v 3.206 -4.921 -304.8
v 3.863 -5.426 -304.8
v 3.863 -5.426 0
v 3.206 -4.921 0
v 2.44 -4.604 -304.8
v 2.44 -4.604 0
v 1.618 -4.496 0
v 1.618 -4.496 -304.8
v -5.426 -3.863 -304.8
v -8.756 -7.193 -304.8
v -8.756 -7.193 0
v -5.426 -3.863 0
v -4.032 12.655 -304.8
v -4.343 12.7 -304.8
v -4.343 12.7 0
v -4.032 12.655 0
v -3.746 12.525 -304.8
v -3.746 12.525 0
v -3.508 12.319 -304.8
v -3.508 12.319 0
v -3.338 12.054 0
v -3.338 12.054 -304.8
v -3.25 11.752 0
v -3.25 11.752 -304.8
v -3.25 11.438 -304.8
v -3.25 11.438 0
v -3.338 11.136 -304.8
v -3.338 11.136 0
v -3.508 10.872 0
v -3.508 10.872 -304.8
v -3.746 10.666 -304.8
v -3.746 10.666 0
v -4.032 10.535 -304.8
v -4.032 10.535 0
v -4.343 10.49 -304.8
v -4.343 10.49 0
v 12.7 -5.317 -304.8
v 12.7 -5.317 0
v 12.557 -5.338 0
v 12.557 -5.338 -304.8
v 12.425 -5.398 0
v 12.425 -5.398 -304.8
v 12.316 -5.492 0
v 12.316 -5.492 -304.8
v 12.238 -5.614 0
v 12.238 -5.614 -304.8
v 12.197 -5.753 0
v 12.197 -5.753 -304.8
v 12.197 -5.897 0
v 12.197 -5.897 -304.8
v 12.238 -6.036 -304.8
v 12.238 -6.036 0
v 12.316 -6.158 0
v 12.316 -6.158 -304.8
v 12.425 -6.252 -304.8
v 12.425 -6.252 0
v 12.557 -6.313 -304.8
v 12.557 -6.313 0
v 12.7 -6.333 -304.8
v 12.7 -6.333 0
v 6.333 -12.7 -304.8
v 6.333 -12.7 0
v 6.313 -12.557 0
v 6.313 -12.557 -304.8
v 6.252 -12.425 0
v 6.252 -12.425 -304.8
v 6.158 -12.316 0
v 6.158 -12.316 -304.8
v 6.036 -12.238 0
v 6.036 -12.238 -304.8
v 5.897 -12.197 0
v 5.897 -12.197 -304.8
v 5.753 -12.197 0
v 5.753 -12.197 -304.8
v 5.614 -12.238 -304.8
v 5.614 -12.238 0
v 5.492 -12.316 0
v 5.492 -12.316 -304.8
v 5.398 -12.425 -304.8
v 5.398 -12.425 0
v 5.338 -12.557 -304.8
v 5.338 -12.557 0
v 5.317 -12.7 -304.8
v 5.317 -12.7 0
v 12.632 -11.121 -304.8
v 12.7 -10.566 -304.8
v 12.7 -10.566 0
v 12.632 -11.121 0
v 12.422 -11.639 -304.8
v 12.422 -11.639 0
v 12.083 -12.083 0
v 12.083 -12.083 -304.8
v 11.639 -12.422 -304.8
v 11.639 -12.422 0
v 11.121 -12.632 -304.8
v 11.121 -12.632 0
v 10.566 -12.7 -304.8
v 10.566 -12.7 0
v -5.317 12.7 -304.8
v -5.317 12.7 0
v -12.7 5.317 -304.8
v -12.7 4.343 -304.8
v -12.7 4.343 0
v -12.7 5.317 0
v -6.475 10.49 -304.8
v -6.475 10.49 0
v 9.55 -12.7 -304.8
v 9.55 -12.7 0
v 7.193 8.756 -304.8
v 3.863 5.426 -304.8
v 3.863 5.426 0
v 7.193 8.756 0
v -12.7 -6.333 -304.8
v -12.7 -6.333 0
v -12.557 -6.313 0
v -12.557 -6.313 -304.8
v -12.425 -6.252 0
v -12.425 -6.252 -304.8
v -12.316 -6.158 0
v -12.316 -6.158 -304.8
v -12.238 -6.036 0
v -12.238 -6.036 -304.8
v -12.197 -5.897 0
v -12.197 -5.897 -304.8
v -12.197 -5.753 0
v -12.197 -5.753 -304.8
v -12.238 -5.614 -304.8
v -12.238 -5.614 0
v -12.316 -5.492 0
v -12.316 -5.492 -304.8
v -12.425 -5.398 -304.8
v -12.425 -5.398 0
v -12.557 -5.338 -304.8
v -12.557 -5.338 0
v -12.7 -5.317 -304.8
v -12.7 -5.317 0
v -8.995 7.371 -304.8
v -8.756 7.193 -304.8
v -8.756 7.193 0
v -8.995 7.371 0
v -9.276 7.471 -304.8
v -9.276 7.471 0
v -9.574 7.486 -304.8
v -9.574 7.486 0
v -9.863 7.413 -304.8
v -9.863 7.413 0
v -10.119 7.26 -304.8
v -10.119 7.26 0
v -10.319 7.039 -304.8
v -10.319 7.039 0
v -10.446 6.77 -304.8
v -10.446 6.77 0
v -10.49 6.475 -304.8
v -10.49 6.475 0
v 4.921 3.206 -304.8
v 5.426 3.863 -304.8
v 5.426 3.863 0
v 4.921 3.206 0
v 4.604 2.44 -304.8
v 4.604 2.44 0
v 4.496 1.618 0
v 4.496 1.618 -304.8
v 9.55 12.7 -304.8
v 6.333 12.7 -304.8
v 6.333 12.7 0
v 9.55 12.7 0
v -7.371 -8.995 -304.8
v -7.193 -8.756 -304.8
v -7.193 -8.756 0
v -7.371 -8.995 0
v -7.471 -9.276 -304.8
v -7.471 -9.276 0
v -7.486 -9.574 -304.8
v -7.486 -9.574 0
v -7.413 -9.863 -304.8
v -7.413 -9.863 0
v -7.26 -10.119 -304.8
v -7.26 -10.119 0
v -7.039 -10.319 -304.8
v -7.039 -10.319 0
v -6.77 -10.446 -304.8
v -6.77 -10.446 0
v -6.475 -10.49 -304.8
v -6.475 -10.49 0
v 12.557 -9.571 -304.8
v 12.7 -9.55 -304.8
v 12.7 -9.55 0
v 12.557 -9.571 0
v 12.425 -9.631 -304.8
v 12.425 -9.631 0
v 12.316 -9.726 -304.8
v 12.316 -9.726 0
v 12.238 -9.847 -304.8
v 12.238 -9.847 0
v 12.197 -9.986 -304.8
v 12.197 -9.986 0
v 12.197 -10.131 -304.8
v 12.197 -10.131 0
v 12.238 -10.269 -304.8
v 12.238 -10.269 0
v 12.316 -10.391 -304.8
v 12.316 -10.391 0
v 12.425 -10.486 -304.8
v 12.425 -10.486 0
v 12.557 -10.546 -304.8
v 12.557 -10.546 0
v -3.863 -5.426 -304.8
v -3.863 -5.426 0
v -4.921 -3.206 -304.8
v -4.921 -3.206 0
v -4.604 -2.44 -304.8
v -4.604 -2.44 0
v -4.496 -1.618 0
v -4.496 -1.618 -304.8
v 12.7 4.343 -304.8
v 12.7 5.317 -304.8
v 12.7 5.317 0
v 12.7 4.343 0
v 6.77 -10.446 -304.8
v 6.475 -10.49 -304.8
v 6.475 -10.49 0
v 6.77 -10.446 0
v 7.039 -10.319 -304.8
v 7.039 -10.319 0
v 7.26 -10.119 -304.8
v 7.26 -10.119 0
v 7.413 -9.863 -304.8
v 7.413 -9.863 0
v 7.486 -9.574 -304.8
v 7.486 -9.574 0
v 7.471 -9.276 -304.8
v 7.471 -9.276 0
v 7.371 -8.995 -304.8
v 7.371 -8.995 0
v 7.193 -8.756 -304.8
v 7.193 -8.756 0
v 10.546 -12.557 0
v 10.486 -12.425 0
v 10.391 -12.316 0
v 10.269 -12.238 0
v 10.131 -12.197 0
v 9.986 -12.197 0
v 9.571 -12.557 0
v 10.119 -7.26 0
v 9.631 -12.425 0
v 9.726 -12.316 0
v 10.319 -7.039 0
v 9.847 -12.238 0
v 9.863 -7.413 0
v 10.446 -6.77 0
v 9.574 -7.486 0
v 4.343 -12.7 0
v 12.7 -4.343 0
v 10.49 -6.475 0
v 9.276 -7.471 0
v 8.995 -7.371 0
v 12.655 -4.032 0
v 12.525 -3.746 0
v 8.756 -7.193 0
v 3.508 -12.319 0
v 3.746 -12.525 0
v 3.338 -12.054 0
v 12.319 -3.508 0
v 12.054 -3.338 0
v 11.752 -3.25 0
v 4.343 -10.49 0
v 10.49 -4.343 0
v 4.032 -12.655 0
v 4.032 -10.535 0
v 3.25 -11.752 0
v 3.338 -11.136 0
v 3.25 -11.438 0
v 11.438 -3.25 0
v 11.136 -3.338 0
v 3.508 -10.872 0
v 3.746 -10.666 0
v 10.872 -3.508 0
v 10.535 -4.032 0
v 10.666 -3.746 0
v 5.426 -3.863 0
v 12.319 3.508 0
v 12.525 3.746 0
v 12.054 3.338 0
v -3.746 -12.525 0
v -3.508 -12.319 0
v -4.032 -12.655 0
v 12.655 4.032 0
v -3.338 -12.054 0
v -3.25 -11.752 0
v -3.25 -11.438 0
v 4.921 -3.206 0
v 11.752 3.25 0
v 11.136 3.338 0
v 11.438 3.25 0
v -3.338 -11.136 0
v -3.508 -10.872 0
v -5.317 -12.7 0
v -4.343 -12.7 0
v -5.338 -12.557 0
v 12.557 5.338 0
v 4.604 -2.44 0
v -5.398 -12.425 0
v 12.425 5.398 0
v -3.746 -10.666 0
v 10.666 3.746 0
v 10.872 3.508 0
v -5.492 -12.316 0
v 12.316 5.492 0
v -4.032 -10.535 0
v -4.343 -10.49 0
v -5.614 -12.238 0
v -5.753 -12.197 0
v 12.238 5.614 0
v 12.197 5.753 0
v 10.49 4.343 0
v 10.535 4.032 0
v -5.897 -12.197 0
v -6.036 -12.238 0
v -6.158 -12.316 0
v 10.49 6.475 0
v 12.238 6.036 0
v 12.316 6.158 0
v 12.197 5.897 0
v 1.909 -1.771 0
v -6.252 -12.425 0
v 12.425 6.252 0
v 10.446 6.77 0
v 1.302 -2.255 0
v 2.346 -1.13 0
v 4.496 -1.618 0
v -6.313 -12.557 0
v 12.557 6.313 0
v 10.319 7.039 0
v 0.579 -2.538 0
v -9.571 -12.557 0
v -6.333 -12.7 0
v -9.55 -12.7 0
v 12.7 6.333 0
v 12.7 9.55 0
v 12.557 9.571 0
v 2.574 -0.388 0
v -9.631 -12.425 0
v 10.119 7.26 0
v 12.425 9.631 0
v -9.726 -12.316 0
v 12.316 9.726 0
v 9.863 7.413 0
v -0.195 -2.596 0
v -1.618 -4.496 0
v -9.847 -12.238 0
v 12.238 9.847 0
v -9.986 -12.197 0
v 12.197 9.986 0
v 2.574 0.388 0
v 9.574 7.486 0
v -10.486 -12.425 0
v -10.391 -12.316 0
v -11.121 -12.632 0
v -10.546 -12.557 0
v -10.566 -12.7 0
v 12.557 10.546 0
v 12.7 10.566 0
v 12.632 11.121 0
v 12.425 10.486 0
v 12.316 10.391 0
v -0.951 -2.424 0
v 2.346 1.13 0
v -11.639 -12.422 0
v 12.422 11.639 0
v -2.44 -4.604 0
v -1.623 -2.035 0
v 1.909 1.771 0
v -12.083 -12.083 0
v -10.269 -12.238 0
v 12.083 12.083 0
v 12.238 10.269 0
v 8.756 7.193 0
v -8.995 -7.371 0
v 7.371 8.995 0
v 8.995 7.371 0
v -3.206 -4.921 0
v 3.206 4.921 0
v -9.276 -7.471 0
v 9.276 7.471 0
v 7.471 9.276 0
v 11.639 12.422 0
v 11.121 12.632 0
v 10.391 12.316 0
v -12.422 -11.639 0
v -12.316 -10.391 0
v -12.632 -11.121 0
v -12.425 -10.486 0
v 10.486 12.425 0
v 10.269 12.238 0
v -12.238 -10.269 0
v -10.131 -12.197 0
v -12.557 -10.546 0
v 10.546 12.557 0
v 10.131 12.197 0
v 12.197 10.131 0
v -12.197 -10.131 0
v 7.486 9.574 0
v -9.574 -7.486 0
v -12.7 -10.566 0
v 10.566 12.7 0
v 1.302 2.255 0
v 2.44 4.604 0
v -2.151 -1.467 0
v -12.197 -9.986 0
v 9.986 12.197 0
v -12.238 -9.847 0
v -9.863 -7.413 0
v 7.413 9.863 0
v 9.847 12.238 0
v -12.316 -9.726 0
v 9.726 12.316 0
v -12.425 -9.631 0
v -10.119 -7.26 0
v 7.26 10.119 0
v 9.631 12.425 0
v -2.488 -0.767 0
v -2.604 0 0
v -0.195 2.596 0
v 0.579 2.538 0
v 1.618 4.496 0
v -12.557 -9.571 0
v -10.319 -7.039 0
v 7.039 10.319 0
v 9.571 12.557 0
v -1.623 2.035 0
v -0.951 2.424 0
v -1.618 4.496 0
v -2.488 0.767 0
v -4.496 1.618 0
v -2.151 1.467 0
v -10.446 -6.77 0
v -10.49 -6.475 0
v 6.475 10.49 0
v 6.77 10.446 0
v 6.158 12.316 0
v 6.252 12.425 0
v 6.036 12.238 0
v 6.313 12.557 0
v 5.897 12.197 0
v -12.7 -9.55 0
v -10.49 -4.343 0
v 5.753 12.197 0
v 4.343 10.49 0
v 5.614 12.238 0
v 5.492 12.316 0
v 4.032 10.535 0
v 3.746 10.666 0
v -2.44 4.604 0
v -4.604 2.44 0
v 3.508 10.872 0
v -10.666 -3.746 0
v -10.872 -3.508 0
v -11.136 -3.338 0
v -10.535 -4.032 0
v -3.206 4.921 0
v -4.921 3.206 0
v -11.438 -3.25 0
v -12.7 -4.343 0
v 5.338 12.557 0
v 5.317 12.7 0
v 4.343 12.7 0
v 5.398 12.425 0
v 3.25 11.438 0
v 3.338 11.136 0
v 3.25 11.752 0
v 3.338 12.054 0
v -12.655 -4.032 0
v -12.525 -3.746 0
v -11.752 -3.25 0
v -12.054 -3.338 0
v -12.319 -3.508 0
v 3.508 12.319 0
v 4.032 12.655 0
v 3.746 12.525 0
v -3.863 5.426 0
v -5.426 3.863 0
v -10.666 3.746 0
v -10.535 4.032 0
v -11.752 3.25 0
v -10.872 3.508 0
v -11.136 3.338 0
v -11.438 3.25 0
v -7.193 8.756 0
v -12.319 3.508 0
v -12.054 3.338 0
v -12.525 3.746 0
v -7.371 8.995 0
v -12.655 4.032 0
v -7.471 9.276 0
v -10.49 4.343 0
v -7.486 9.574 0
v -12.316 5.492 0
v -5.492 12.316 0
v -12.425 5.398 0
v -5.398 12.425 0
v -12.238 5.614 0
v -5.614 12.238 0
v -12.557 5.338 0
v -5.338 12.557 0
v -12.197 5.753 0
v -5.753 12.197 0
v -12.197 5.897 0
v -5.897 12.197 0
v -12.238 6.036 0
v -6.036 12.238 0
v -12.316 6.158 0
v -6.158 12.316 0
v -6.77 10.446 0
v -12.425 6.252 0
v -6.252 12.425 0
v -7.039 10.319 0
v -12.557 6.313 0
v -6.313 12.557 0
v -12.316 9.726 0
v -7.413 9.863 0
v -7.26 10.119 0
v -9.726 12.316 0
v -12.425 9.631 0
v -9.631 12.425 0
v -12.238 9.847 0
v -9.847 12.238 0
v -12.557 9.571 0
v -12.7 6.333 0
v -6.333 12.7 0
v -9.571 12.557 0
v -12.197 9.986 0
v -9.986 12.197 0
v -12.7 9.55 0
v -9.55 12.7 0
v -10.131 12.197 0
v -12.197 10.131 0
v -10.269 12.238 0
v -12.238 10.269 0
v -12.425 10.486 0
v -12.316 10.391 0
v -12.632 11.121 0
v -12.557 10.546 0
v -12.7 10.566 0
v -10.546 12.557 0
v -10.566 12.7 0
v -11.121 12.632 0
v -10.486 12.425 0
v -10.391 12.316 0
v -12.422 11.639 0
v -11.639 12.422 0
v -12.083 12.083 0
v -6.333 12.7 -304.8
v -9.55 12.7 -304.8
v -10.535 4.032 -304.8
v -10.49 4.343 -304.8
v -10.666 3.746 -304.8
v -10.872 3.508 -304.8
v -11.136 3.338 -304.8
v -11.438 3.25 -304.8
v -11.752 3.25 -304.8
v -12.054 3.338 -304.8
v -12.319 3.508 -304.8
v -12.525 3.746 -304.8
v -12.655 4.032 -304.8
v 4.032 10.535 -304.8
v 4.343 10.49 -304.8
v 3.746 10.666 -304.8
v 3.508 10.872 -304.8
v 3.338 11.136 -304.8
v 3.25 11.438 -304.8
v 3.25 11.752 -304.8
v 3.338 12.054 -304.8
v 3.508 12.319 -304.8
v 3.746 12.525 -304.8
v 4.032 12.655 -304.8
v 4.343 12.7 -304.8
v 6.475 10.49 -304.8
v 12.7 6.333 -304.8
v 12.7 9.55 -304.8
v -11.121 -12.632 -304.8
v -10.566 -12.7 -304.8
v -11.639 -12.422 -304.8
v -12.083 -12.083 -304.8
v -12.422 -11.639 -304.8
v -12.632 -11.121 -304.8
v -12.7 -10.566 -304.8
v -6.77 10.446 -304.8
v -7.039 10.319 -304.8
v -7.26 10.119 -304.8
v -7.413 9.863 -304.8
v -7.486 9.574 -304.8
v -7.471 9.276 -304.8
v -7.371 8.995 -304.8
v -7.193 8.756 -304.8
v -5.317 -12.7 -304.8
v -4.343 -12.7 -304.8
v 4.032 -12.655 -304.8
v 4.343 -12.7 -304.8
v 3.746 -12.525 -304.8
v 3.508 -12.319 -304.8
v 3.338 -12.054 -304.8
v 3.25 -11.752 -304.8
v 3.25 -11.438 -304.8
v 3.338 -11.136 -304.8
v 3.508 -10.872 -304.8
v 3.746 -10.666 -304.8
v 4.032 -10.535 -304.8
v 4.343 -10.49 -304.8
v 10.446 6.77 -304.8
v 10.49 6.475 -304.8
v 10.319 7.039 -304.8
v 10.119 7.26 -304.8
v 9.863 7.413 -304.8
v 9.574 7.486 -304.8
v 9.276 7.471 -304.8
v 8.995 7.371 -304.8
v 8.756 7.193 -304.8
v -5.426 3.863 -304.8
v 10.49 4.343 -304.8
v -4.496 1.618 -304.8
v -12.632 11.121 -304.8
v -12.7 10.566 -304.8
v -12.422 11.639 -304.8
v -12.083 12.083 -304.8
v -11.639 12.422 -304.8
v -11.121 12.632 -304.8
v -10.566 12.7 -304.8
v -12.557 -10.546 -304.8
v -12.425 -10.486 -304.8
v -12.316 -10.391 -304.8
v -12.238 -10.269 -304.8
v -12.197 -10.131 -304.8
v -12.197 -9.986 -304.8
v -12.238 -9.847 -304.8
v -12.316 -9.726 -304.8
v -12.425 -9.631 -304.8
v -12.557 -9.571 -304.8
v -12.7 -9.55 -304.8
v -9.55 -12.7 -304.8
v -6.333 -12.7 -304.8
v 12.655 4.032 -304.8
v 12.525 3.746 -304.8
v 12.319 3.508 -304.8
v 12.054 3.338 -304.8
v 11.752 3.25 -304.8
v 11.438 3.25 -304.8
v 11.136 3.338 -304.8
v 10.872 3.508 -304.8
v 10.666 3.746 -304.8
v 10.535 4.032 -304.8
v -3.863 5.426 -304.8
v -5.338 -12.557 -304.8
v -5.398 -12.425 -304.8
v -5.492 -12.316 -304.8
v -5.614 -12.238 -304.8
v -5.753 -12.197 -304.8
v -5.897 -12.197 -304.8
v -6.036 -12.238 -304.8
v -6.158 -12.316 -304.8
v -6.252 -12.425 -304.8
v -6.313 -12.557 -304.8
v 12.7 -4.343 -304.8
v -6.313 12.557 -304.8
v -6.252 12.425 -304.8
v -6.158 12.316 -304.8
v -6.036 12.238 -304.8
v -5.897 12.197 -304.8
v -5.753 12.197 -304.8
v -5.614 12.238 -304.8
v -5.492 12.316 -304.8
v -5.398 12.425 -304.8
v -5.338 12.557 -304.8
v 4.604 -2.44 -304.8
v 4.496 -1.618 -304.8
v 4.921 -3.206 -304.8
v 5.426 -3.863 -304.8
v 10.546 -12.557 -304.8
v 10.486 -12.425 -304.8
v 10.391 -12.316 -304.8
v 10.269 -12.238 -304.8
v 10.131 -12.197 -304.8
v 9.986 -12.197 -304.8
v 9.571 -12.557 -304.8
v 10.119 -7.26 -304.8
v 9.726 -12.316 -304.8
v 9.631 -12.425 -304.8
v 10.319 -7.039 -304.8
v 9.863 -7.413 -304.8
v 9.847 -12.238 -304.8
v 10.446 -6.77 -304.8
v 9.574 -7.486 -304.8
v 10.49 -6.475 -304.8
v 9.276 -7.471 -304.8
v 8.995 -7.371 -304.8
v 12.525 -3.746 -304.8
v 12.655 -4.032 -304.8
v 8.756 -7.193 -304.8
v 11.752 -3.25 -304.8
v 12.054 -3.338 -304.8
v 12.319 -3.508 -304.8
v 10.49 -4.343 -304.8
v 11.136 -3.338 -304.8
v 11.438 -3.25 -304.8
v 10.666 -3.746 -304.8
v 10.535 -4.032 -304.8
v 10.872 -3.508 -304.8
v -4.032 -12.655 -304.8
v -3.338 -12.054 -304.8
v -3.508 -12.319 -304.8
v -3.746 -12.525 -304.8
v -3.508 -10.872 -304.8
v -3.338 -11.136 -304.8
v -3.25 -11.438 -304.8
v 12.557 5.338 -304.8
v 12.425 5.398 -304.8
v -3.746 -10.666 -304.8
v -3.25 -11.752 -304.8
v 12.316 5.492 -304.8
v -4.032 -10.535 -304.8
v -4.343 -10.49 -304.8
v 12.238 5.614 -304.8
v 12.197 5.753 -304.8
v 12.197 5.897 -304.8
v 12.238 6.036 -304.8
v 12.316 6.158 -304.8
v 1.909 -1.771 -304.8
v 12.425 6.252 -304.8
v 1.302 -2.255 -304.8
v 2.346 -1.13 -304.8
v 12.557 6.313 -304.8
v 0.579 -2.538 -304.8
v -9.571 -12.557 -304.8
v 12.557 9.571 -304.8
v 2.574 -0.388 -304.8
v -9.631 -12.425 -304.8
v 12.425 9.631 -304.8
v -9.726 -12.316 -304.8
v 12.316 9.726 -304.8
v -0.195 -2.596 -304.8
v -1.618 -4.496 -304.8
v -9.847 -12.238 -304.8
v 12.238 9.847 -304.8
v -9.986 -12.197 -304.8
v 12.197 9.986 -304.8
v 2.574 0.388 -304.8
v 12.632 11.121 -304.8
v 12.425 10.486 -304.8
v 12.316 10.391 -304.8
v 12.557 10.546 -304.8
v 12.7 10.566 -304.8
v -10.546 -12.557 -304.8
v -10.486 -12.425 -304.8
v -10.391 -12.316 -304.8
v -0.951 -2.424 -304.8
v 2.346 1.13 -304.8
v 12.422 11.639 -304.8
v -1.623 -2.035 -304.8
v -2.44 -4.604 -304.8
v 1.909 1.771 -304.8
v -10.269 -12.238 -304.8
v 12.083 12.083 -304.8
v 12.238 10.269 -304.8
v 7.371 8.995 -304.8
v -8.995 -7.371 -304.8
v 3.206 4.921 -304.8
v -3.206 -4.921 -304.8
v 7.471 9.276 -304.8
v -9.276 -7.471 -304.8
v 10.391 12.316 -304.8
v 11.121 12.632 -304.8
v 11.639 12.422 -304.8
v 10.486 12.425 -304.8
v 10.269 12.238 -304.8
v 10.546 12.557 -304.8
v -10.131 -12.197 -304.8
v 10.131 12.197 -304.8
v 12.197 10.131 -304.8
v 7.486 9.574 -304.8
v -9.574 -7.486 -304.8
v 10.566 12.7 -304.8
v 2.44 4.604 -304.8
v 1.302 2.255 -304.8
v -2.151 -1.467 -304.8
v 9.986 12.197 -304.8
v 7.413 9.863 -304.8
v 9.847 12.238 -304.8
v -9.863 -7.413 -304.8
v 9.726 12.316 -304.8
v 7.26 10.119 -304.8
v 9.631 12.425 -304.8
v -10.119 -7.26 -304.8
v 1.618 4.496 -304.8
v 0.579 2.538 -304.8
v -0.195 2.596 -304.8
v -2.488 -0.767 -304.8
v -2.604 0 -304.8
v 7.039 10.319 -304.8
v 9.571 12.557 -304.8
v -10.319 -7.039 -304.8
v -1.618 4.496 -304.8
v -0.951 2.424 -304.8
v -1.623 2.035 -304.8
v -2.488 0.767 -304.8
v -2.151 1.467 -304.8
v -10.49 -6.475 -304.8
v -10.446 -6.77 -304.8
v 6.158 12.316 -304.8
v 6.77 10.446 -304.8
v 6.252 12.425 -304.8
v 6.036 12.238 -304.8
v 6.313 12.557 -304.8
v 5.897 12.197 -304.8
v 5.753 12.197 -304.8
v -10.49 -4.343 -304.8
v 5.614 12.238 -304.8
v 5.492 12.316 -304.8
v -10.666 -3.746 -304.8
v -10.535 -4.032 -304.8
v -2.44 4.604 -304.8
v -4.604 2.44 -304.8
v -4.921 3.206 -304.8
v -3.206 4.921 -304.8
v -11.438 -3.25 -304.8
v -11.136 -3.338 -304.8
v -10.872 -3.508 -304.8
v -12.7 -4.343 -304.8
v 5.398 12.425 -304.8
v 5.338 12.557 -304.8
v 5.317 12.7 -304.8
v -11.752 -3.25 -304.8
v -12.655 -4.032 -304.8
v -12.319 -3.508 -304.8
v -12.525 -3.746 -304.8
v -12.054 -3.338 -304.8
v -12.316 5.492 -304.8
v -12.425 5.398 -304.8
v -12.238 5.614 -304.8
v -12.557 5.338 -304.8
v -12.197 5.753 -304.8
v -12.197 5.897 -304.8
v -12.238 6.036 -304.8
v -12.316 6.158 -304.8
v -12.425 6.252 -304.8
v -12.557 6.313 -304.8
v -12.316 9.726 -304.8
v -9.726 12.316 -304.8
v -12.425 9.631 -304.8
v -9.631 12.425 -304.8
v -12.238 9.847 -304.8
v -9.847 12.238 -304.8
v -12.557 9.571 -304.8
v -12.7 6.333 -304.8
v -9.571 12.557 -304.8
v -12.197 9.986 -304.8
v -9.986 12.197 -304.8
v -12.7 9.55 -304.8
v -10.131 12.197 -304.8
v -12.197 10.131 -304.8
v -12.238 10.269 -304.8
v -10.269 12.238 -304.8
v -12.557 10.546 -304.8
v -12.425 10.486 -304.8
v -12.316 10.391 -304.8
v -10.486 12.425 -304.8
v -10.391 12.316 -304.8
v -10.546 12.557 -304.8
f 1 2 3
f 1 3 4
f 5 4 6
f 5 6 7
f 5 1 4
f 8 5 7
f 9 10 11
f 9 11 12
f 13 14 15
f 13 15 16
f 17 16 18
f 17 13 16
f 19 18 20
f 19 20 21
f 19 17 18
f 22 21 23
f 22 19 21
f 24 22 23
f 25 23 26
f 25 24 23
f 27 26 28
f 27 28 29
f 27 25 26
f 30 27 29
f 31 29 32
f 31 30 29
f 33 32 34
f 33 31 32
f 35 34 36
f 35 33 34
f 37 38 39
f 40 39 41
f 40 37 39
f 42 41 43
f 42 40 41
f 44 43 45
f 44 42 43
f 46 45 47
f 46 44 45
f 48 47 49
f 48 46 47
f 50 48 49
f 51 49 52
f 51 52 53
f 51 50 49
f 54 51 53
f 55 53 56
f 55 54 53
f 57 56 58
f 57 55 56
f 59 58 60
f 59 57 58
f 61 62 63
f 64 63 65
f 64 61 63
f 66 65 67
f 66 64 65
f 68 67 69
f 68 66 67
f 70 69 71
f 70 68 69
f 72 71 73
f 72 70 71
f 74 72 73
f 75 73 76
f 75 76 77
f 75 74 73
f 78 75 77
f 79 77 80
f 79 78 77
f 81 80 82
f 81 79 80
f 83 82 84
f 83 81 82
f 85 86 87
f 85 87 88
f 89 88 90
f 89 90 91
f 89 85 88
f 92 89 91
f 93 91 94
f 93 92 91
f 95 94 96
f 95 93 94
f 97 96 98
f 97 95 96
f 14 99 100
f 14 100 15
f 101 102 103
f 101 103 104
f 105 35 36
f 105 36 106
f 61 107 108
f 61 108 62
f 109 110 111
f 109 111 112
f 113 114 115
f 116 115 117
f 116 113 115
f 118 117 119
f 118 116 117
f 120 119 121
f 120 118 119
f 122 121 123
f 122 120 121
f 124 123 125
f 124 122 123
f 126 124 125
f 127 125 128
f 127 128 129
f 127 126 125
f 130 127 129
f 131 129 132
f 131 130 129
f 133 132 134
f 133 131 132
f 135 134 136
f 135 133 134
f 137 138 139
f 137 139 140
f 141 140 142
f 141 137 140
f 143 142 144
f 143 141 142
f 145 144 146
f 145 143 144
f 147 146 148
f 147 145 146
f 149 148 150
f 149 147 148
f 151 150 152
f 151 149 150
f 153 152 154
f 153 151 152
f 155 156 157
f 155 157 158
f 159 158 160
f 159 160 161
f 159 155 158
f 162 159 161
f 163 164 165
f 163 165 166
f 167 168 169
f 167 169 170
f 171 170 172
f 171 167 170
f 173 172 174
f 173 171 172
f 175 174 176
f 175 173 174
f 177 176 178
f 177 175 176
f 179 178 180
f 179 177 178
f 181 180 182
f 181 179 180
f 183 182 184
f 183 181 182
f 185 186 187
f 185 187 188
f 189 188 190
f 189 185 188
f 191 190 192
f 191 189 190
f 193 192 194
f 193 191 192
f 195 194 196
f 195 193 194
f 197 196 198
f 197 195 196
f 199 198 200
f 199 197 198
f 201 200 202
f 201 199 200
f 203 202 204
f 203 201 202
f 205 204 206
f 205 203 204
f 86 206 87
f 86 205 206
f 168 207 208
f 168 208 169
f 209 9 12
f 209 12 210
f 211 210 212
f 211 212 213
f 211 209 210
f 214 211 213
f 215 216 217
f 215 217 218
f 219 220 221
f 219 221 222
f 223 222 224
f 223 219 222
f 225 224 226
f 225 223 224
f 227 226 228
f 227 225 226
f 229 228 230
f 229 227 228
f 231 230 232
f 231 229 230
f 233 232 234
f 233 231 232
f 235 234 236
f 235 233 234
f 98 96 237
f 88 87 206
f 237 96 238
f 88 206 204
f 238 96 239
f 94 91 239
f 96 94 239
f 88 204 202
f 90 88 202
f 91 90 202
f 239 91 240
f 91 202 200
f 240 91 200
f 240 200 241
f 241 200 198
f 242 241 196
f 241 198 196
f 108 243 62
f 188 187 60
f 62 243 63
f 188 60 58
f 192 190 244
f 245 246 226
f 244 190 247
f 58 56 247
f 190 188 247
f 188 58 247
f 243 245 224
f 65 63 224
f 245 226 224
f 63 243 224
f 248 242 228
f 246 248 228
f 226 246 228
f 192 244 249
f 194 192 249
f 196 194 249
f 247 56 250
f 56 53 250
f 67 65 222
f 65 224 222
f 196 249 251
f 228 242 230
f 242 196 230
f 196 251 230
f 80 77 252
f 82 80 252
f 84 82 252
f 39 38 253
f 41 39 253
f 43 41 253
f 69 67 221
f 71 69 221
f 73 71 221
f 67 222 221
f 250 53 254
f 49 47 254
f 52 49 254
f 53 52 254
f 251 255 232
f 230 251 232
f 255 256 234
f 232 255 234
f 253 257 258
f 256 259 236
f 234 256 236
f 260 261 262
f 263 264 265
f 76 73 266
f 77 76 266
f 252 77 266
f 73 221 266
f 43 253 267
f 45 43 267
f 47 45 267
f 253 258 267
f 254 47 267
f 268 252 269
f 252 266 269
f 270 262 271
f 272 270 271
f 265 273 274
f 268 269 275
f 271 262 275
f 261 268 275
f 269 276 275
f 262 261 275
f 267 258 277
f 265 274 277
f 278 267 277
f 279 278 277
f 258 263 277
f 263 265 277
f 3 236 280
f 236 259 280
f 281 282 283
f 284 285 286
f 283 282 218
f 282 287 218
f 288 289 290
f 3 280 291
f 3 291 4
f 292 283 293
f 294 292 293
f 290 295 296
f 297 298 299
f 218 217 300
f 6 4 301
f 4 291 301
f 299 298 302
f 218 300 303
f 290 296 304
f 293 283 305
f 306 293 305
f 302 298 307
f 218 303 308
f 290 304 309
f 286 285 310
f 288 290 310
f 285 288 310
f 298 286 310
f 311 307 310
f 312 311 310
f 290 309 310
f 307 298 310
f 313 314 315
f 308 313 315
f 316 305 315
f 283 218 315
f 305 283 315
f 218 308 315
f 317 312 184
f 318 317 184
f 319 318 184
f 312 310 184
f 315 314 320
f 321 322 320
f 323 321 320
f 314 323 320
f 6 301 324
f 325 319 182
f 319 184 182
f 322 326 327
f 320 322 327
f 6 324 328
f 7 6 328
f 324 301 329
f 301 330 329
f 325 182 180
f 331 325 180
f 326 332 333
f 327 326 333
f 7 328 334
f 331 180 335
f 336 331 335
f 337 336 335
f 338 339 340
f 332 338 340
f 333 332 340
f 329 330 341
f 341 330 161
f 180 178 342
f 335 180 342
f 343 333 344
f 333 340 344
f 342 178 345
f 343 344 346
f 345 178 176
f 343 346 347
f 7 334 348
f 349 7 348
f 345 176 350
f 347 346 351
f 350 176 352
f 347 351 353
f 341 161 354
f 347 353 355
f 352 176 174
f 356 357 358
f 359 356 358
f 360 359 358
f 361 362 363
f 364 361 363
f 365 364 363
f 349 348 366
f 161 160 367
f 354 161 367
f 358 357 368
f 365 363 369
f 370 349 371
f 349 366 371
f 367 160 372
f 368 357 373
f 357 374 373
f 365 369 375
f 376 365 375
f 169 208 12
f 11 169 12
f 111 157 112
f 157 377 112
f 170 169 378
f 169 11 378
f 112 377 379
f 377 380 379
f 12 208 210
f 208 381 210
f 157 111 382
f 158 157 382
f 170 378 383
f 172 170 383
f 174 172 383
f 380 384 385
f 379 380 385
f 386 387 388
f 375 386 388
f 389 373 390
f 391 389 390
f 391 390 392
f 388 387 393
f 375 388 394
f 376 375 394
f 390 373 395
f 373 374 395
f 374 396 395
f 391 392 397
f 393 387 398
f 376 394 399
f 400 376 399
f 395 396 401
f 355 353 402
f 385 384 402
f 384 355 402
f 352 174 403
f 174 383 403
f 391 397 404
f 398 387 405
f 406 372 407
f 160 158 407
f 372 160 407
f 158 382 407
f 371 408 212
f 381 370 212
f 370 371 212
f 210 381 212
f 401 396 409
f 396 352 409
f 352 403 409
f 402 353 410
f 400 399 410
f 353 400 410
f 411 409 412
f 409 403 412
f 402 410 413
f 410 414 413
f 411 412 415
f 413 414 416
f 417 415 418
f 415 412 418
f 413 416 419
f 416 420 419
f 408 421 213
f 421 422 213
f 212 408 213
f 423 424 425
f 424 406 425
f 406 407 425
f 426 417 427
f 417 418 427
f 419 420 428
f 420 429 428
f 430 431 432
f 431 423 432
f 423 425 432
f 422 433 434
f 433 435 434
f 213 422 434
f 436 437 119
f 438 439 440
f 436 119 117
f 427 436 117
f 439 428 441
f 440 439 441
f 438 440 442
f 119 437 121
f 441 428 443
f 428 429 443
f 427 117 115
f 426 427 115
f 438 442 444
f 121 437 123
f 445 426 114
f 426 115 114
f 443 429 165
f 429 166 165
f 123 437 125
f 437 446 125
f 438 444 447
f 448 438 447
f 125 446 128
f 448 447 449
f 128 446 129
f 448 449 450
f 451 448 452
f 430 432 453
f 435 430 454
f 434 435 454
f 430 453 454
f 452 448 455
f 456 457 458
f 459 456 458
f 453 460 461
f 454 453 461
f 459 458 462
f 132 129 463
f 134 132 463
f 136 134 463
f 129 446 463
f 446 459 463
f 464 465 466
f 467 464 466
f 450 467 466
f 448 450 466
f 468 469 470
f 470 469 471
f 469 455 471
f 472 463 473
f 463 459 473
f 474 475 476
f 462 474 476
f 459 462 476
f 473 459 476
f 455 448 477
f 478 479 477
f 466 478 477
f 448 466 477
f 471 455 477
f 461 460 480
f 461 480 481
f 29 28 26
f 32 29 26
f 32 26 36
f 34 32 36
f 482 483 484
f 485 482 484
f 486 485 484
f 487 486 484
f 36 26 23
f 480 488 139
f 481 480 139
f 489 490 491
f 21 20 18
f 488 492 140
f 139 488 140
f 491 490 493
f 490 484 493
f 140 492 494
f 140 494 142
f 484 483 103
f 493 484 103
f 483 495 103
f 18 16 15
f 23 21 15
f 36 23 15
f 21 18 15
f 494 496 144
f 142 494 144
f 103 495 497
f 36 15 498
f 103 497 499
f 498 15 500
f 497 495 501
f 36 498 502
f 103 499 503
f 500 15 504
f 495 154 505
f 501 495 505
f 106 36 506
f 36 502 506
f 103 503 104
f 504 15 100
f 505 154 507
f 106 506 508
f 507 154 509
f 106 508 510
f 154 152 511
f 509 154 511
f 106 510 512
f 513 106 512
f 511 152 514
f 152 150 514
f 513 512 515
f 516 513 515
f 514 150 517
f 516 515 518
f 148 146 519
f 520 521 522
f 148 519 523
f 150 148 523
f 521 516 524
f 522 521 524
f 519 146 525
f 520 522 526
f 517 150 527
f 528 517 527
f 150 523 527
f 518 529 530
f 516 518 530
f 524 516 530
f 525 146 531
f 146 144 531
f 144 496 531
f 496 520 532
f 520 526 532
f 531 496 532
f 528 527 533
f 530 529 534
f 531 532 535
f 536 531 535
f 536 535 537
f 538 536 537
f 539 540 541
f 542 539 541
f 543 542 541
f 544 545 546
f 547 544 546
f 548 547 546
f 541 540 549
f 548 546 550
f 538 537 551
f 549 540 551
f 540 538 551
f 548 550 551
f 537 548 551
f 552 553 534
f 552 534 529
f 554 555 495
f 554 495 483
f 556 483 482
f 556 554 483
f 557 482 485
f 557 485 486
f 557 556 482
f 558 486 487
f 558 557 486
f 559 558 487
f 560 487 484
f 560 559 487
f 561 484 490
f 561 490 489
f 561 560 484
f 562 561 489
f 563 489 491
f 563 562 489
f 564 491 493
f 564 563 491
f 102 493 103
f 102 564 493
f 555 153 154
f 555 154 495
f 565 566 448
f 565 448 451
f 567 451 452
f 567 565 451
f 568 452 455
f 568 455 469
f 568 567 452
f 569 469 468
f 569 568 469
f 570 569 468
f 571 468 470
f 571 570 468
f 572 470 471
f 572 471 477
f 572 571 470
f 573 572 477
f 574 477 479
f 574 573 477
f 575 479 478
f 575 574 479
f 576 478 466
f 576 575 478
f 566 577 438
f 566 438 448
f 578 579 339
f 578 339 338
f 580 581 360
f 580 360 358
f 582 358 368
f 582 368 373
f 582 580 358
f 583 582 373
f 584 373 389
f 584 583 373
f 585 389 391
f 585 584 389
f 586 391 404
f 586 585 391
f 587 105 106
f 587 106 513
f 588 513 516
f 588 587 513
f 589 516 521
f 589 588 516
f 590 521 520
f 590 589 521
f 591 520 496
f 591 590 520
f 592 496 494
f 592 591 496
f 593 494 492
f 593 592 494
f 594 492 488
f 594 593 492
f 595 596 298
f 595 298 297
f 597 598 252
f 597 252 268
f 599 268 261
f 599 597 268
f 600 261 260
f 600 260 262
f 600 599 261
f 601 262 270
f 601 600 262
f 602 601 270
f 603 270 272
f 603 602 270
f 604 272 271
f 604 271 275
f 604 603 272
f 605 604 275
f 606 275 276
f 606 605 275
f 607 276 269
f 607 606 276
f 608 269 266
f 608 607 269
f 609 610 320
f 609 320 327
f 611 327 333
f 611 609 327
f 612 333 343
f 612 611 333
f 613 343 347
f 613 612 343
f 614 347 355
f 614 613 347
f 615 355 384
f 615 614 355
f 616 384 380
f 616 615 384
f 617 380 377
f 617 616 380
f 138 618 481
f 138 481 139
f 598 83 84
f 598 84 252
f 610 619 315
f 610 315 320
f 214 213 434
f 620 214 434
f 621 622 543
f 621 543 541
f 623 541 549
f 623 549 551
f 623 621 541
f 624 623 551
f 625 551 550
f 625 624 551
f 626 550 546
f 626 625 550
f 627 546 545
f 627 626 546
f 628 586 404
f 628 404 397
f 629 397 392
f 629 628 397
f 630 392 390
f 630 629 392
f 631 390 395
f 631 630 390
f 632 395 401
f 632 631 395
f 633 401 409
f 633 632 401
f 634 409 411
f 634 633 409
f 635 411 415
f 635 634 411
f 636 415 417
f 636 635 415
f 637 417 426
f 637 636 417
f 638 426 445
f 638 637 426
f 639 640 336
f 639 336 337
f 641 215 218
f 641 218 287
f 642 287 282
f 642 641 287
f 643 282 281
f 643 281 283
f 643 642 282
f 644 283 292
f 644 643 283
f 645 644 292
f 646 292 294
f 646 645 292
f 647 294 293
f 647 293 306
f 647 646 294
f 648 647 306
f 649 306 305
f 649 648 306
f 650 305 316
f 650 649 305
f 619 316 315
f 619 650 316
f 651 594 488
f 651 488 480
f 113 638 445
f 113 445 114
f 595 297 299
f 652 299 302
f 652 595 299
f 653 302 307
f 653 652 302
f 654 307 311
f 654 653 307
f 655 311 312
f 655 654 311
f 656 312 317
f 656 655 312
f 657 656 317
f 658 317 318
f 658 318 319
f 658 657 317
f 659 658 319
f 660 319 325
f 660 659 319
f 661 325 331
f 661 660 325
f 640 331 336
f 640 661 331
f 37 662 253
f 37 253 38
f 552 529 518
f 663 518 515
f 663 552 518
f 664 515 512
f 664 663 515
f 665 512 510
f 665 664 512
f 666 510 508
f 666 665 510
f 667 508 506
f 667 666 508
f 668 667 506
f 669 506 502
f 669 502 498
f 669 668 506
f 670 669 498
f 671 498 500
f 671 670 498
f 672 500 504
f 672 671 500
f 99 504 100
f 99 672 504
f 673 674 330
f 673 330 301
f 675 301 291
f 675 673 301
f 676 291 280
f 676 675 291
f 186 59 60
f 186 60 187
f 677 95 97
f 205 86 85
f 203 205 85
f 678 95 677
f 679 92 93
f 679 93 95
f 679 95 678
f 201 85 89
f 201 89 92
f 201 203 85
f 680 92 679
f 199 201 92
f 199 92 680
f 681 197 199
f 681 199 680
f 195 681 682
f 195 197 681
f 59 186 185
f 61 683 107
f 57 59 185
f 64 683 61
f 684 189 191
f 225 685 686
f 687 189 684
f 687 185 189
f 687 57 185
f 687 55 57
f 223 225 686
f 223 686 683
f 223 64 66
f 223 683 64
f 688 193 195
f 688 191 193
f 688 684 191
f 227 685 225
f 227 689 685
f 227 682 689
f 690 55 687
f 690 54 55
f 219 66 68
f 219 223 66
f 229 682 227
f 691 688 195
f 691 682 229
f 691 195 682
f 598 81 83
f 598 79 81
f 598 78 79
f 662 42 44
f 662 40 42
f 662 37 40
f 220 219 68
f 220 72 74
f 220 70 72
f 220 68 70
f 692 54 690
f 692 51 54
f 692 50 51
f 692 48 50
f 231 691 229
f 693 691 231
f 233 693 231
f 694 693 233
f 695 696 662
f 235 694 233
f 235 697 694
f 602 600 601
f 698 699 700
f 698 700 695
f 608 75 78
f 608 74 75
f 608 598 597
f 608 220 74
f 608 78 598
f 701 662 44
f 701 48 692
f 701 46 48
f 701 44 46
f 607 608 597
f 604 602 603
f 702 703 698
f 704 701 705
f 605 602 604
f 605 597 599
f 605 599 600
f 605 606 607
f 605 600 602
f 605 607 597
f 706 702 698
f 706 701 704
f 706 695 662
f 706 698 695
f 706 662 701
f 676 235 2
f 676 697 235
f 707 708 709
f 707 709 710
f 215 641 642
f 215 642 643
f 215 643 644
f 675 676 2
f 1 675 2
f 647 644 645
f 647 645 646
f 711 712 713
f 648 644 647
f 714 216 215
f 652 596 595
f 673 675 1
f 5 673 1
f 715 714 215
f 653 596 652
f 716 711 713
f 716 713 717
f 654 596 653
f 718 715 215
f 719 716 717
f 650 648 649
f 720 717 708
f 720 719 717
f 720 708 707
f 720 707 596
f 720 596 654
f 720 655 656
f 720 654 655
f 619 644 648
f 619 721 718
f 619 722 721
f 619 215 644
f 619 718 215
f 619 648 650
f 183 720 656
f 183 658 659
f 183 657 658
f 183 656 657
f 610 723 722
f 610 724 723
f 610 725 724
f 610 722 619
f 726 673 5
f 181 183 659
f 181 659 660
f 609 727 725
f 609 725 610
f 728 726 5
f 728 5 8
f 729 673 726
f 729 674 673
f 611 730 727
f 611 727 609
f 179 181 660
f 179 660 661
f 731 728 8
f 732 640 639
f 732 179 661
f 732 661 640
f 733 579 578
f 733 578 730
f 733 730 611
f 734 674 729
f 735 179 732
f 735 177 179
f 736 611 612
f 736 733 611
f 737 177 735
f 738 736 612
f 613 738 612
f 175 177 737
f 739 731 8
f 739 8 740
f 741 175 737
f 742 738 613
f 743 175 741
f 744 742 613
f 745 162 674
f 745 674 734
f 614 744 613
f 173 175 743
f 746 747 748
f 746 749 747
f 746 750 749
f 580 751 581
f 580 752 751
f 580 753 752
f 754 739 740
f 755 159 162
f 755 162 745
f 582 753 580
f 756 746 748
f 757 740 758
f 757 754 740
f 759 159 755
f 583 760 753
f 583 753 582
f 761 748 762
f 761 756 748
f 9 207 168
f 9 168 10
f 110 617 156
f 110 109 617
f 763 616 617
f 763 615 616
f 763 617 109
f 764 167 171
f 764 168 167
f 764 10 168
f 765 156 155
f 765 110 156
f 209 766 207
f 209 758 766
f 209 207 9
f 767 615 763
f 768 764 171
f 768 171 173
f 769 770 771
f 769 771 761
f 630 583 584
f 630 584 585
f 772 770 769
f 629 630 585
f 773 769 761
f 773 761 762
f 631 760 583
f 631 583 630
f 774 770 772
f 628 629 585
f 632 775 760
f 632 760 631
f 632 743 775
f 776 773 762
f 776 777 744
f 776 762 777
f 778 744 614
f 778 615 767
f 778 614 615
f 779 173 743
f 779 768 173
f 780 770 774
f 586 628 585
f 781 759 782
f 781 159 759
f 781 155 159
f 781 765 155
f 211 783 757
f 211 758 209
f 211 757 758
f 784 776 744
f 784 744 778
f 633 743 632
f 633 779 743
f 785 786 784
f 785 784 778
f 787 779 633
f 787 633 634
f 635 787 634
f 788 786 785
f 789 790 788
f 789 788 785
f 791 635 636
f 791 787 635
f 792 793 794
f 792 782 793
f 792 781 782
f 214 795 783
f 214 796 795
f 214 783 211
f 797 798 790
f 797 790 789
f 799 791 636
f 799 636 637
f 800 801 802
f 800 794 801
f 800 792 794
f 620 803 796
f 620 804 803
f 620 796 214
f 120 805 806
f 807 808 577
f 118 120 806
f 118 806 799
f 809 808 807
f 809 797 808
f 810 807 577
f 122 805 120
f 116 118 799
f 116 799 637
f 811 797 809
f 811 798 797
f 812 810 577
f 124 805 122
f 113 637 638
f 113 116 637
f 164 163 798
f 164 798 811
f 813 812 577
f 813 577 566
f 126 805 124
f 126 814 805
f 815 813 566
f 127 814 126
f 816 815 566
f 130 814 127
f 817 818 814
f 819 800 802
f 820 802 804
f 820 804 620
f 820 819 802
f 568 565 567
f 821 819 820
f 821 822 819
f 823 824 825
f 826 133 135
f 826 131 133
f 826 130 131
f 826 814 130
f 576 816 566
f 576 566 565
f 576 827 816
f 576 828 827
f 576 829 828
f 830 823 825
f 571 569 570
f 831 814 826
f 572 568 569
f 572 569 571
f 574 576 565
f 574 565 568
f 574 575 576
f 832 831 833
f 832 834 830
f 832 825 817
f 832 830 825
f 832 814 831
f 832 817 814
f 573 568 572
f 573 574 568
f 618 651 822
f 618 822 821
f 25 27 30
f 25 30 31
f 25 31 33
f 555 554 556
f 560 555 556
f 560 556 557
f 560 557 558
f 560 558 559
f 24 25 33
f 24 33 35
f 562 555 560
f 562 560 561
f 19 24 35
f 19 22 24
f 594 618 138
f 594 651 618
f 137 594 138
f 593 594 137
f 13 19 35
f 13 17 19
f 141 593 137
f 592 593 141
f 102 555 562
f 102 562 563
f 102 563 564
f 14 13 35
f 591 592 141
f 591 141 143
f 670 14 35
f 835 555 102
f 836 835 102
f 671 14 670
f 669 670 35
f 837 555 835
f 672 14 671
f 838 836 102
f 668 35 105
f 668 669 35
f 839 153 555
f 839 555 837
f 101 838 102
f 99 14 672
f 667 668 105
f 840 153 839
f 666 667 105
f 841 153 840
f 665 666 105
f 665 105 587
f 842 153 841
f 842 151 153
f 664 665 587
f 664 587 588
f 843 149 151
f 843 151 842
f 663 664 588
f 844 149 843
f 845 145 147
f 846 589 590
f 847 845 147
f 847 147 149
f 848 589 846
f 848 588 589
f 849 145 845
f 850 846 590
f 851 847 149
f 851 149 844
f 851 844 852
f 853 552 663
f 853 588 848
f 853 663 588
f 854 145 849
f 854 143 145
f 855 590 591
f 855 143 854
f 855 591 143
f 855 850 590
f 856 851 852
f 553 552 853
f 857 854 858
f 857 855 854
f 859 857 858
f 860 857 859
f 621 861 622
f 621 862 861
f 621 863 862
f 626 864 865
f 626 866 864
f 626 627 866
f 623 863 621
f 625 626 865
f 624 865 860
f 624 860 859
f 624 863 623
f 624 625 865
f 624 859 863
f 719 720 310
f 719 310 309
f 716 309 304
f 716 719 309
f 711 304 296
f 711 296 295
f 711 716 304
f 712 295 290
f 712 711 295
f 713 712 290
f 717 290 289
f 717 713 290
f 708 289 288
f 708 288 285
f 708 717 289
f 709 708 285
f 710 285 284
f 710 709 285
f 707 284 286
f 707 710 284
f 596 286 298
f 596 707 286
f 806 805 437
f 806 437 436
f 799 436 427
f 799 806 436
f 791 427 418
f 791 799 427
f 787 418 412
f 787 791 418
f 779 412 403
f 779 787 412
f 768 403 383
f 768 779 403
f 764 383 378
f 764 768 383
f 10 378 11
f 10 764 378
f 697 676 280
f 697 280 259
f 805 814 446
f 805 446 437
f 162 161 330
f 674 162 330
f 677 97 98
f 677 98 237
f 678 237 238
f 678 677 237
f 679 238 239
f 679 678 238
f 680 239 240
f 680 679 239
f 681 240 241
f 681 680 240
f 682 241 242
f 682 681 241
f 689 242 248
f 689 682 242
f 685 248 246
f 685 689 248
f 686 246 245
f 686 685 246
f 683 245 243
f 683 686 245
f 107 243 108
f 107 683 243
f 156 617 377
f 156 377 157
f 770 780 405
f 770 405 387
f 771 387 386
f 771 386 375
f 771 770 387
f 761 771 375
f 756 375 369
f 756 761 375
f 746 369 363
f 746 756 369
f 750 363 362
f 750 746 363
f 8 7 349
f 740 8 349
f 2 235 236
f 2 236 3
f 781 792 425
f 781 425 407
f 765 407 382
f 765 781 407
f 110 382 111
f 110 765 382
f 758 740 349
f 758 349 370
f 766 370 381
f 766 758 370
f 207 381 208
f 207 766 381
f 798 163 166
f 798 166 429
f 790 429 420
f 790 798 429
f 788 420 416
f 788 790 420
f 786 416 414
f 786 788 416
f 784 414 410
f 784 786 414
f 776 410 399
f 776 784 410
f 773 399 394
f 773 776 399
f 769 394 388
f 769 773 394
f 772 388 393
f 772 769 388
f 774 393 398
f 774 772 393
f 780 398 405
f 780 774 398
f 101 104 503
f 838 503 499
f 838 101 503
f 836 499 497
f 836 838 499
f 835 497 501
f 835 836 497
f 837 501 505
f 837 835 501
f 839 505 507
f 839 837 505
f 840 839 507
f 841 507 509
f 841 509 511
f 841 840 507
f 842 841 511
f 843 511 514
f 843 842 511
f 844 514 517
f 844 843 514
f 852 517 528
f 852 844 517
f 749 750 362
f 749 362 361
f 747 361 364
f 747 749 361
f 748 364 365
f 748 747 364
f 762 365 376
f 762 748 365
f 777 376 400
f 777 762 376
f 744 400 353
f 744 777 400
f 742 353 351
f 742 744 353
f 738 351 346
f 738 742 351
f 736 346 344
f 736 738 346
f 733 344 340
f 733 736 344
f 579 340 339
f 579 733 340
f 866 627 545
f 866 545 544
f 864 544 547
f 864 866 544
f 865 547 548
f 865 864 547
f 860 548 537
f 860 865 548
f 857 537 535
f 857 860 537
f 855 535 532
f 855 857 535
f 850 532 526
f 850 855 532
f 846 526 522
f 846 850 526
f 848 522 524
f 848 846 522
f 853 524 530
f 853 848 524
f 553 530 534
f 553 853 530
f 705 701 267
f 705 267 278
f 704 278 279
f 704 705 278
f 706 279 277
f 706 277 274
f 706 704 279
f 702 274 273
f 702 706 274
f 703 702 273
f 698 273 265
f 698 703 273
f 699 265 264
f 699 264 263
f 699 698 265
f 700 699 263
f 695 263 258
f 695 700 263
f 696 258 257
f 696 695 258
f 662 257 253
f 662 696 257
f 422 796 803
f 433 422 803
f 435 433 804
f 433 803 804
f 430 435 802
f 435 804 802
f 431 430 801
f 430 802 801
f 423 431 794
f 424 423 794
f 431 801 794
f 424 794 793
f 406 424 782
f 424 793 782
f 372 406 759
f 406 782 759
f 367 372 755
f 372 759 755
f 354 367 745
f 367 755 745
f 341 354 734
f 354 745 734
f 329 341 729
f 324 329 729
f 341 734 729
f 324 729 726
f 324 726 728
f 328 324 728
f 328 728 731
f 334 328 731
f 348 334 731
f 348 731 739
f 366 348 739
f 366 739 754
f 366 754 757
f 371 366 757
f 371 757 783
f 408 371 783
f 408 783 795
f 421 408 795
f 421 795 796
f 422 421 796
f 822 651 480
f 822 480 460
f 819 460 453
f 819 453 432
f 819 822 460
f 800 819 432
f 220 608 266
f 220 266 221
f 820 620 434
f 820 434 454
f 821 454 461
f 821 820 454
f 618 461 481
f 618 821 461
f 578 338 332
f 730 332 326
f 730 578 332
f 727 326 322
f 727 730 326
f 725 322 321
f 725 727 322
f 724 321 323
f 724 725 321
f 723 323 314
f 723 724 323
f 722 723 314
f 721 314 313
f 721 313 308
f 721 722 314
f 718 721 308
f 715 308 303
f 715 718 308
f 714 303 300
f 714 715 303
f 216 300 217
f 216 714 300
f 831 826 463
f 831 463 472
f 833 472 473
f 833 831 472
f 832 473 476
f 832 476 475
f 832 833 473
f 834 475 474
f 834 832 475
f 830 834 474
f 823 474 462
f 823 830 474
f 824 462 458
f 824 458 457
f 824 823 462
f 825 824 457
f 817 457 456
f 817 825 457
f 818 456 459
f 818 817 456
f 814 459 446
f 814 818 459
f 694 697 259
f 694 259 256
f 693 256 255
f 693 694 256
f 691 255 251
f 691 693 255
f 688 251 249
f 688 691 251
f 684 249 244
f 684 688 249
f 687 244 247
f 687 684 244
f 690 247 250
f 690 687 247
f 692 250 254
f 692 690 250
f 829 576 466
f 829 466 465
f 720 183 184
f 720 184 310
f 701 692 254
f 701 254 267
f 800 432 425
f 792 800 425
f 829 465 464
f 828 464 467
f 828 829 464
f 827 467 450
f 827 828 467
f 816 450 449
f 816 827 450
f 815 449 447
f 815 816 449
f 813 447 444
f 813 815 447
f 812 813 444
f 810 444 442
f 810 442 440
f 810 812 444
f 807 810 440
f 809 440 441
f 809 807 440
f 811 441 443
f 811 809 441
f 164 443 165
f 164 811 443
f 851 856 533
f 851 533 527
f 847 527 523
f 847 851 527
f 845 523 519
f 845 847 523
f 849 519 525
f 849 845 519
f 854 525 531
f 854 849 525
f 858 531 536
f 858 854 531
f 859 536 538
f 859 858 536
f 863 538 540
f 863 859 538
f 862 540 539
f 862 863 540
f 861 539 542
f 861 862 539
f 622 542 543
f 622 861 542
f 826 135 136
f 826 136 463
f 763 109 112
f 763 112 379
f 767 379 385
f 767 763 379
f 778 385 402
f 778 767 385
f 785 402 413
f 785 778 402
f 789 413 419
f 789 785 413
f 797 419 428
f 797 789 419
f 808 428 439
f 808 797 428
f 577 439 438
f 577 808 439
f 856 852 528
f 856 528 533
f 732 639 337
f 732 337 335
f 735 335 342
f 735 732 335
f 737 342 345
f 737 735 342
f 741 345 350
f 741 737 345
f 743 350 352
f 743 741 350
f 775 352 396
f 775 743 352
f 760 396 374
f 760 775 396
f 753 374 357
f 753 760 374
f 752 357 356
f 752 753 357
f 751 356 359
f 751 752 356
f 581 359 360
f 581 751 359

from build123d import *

# Parameters (mm, degrees)
SKETCH1_R           = 2.6035
BOSS_EXTRUDE1_DEPTH = 1270
SKETCH6_W           = 122.666969327
SKETCH6_H           = 109.347800906
CUT_EXTRUDE1_DEPTH  = 572.5
SKETCH7_W           = 38.999416314
SKETCH7_H           = 31.386968174
CUT_EXTRUDE2_DEPTH  = 393.7


with BuildPart() as part:
    # Sketch1 → Boss-Extrude1 (new body)
    with BuildSketch(Plane(origin=(0, 0, -1270), x_dir=(-1, 0, 0), z_dir=(0, 0, -1))):
        with BuildLine():
            Line((12.7, -9.5504), (12.7, -6.3330836))
            ThreePointArc((12.7, -6.3330836), (12.192, -5.8250836), (12.7, -5.3170836))
            Line((12.7, -5.3170836), (12.7, -4.3434))
            ThreePointArc((12.7, -4.3434), (11.5951, -3.2385), (10.4902, -4.3434))
            Line((10.4902, -4.3434), (10.4902, -6.474794456))
            ThreePointArc((10.4902, -6.474794456), (9.863006367, -7.413456061), (8.75577951, -7.193214945))
            Line((8.75577951, -7.193214945), (5.42573597, -3.863171405))
            ThreePointArc((5.42573597, -3.863171405), (4.737482484, -2.833127272), (4.4958, -1.618107374))
            Line((4.4958, -1.618107374), (4.4958, 1.618107374))
            ThreePointArc((4.4958, 1.618107374), (4.737482484, 2.833127272), (5.42573597, 3.863171405))
            Line((5.42573597, 3.863171405), (8.75577951, 7.193214945))
            ThreePointArc((8.75577951, 7.193214945), (9.863006367, 7.413456061), (10.4902, 6.474794456))
            Line((10.4902, 6.474794456), (10.4902, 4.343399971))
            ThreePointArc((10.4902, 4.343399971), (11.5951, 3.238499971), (12.7, 4.343399971))
            Line((12.7, 4.343399971), (12.7, 5.3170836))
            ThreePointArc((12.7, 5.3170836), (12.192, 5.8250836), (12.7, 6.3330836))
            Line((12.7, 6.3330836), (12.7, 9.5504))
            ThreePointArc((12.7, 9.5504), (12.192000006, 10.058323491), (12.699846982, 10.566399977))
            ThreePointArc((12.699846982, 10.566399977), (12.082522516, 12.082522516), (10.566399977, 12.699846982))
            ThreePointArc((10.566399977, 12.699846982), (10.058323491, 12.192000006), (9.5504, 12.7))
            Line((9.5504, 12.7), (6.3330836, 12.7))
            ThreePointArc((6.3330836, 12.7), (5.8250836, 12.192), (5.3170836, 12.7))
            Line((5.3170836, 12.7), (4.3434, 12.7))
            ThreePointArc((4.3434, 12.7), (3.2385, 11.5951), (4.3434, 10.4902))
            Line((4.3434, 10.4902), (6.474794456, 10.4902))
            ThreePointArc((6.474794456, 10.4902), (7.413456061, 9.863006367), (7.193214945, 8.75577951))
            Line((7.193214945, 8.75577951), (3.863171405, 5.42573597))
            ThreePointArc((3.863171405, 5.42573597), (2.833127272, 4.737482484), (1.618107374, 4.4958))
            Line((1.618107374, 4.4958), (-1.618107374, 4.4958))
            ThreePointArc((-1.618107374, 4.4958), (-2.833127272, 4.737482484), (-3.863171405, 5.42573597))
            Line((-3.863171405, 5.42573597), (-7.193214945, 8.75577951))
            ThreePointArc((-7.193214945, 8.75577951), (-7.413456061, 9.863006367), (-6.474794456, 10.4902))
            Line((-6.474794456, 10.4902), (-4.343399971, 10.4902))
            ThreePointArc((-4.343399971, 10.4902), (-3.238499971, 11.5951), (-4.343399971, 12.7))
            Line((-4.343399971, 12.7), (-5.3170836, 12.7))
            ThreePointArc((-5.3170836, 12.7), (-5.8250836, 12.192), (-6.3330836, 12.7))
            Line((-6.3330836, 12.7), (-9.5504, 12.7))
            ThreePointArc((-9.5504, 12.7), (-10.058323491, 12.192000006), (-10.566399977, 12.699846982))
            ThreePointArc((-10.566399977, 12.699846982), (-12.082522516, 12.082522516), (-12.699846982, 10.566399977))
            ThreePointArc((-12.699846982, 10.566399977), (-12.192000006, 10.058323491), (-12.7, 9.5504))
            Line((-12.7, 9.5504), (-12.7, 6.3330836))
            ThreePointArc((-12.7, 6.3330836), (-12.192, 5.8250836), (-12.7, 5.3170836))
            Line((-12.7, 5.3170836), (-12.7, 4.3434))
            ThreePointArc((-12.7, 4.3434), (-11.5951, 3.2385), (-10.4902, 4.3434))
            Line((-10.4902, 4.3434), (-10.4902, 6.474794456))
            ThreePointArc((-10.4902, 6.474794456), (-9.863006367, 7.413456061), (-8.75577951, 7.193214945))
            Line((-8.75577951, 7.193214945), (-5.42573597, 3.863171405))
            ThreePointArc((-5.42573597, 3.863171405), (-4.737482484, 2.833127272), (-4.4958, 1.618107374))
            Line((-4.4958, 1.618107374), (-4.4958, -1.618107374))
            ThreePointArc((-4.4958, -1.618107374), (-4.737482484, -2.833127272), (-5.42573597, -3.863171405))
            Line((-5.42573597, -3.863171405), (-8.75577951, -7.193214945))
            ThreePointArc((-8.75577951, -7.193214945), (-9.863006367, -7.413456061), (-10.4902, -6.474794456))
            Line((-10.4902, -6.474794456), (-10.4902, -4.343399971))
            ThreePointArc((-10.4902, -4.343399971), (-11.5951, -3.238499971), (-12.7, -4.343399971))
            Line((-12.7, -4.343399971), (-12.7, -5.3170836))
            ThreePointArc((-12.7, -5.3170836), (-12.192, -5.8250836), (-12.7, -6.3330836))
            Line((-12.7, -6.3330836), (-12.7, -9.5504))
            ThreePointArc((-12.7, -9.5504), (-12.192000006, -10.058323491), (-12.699846982, -10.566399977))
            ThreePointArc((-12.699846982, -10.566399977), (-12.082522516, -12.082522516), (-10.566399977, -12.699846982))
            ThreePointArc((-10.566399977, -12.699846982), (-10.058323491, -12.192000006), (-9.5504, -12.7))
            Line((-9.5504, -12.7), (-6.3330836, -12.7))
            ThreePointArc((-6.3330836, -12.7), (-5.8250836, -12.192), (-5.3170836, -12.7))
            Line((-5.3170836, -12.7), (-4.3434, -12.7))
            ThreePointArc((-4.3434, -12.7), (-3.2385, -11.5951), (-4.3434, -10.4902))
            Line((-4.3434, -10.4902), (-6.474794456, -10.4902))
            ThreePointArc((-6.474794456, -10.4902), (-7.413456061, -9.863006367), (-7.193214945, -8.75577951))
            Line((-7.193214945, -8.75577951), (-3.863171405, -5.42573597))
            ThreePointArc((-3.863171405, -5.42573597), (-2.833127272, -4.737482484), (-1.618107374, -4.4958))
            Line((-1.618107374, -4.4958), (1.618107374, -4.4958))
            ThreePointArc((1.618107374, -4.4958), (2.833127272, -4.737482484), (3.863171405, -5.42573597))
            Line((3.863171405, -5.42573597), (7.193214945, -8.75577951))
            ThreePointArc((7.193214945, -8.75577951), (7.413456061, -9.863006367), (6.474794456, -10.4902))
            Line((6.474794456, -10.4902), (4.343399971, -10.4902))
            ThreePointArc((4.343399971, -10.4902), (3.238499971, -11.5951), (4.343399971, -12.7))
            Line((4.343399971, -12.7), (5.3170836, -12.7))
            ThreePointArc((5.3170836, -12.7), (5.8250836, -12.192), (6.3330836, -12.7))
            Line((6.3330836, -12.7), (9.5504, -12.7))
            ThreePointArc((9.5504, -12.7), (10.058323491, -12.192000006), (10.566399977, -12.699846982))
            ThreePointArc((10.566399977, -12.699846982), (12.082522516, -12.082522516), (12.699846982, -10.566399977))
            ThreePointArc((12.699846982, -10.566399977), (12.192000006, -10.058323491), (12.7, -9.5504))
        make_face()
        Circle(SKETCH1_R, mode=Mode.SUBTRACT)
    extrude(amount=-BOSS_EXTRUDE1_DEPTH)

    # Sketch6 → Cut-Extrude1 (cut, through all)
    with BuildSketch(Plane(origin=(0, 0, -698.5), x_dir=(-1, 0, 0), z_dir=(0, 0, -1))):
        with Locations((17.668938213, -20.549718265)):
            Rectangle(SKETCH6_W, SKETCH6_H)
    extrude(amount=CUT_EXTRUDE1_DEPTH, mode=Mode.SUBTRACT)

    # Sketch7 → Cut-Extrude2 (cut)
    with BuildSketch(Plane(origin=(0, 0, -698.5), x_dir=(-1, 0, 0), z_dir=(0, 0, -1))):
        Rectangle(SKETCH7_W, SKETCH7_H)
    extrude(amount=-CUT_EXTRUDE2_DEPTH, mode=Mode.SUBTRACT)


solid = part.part
